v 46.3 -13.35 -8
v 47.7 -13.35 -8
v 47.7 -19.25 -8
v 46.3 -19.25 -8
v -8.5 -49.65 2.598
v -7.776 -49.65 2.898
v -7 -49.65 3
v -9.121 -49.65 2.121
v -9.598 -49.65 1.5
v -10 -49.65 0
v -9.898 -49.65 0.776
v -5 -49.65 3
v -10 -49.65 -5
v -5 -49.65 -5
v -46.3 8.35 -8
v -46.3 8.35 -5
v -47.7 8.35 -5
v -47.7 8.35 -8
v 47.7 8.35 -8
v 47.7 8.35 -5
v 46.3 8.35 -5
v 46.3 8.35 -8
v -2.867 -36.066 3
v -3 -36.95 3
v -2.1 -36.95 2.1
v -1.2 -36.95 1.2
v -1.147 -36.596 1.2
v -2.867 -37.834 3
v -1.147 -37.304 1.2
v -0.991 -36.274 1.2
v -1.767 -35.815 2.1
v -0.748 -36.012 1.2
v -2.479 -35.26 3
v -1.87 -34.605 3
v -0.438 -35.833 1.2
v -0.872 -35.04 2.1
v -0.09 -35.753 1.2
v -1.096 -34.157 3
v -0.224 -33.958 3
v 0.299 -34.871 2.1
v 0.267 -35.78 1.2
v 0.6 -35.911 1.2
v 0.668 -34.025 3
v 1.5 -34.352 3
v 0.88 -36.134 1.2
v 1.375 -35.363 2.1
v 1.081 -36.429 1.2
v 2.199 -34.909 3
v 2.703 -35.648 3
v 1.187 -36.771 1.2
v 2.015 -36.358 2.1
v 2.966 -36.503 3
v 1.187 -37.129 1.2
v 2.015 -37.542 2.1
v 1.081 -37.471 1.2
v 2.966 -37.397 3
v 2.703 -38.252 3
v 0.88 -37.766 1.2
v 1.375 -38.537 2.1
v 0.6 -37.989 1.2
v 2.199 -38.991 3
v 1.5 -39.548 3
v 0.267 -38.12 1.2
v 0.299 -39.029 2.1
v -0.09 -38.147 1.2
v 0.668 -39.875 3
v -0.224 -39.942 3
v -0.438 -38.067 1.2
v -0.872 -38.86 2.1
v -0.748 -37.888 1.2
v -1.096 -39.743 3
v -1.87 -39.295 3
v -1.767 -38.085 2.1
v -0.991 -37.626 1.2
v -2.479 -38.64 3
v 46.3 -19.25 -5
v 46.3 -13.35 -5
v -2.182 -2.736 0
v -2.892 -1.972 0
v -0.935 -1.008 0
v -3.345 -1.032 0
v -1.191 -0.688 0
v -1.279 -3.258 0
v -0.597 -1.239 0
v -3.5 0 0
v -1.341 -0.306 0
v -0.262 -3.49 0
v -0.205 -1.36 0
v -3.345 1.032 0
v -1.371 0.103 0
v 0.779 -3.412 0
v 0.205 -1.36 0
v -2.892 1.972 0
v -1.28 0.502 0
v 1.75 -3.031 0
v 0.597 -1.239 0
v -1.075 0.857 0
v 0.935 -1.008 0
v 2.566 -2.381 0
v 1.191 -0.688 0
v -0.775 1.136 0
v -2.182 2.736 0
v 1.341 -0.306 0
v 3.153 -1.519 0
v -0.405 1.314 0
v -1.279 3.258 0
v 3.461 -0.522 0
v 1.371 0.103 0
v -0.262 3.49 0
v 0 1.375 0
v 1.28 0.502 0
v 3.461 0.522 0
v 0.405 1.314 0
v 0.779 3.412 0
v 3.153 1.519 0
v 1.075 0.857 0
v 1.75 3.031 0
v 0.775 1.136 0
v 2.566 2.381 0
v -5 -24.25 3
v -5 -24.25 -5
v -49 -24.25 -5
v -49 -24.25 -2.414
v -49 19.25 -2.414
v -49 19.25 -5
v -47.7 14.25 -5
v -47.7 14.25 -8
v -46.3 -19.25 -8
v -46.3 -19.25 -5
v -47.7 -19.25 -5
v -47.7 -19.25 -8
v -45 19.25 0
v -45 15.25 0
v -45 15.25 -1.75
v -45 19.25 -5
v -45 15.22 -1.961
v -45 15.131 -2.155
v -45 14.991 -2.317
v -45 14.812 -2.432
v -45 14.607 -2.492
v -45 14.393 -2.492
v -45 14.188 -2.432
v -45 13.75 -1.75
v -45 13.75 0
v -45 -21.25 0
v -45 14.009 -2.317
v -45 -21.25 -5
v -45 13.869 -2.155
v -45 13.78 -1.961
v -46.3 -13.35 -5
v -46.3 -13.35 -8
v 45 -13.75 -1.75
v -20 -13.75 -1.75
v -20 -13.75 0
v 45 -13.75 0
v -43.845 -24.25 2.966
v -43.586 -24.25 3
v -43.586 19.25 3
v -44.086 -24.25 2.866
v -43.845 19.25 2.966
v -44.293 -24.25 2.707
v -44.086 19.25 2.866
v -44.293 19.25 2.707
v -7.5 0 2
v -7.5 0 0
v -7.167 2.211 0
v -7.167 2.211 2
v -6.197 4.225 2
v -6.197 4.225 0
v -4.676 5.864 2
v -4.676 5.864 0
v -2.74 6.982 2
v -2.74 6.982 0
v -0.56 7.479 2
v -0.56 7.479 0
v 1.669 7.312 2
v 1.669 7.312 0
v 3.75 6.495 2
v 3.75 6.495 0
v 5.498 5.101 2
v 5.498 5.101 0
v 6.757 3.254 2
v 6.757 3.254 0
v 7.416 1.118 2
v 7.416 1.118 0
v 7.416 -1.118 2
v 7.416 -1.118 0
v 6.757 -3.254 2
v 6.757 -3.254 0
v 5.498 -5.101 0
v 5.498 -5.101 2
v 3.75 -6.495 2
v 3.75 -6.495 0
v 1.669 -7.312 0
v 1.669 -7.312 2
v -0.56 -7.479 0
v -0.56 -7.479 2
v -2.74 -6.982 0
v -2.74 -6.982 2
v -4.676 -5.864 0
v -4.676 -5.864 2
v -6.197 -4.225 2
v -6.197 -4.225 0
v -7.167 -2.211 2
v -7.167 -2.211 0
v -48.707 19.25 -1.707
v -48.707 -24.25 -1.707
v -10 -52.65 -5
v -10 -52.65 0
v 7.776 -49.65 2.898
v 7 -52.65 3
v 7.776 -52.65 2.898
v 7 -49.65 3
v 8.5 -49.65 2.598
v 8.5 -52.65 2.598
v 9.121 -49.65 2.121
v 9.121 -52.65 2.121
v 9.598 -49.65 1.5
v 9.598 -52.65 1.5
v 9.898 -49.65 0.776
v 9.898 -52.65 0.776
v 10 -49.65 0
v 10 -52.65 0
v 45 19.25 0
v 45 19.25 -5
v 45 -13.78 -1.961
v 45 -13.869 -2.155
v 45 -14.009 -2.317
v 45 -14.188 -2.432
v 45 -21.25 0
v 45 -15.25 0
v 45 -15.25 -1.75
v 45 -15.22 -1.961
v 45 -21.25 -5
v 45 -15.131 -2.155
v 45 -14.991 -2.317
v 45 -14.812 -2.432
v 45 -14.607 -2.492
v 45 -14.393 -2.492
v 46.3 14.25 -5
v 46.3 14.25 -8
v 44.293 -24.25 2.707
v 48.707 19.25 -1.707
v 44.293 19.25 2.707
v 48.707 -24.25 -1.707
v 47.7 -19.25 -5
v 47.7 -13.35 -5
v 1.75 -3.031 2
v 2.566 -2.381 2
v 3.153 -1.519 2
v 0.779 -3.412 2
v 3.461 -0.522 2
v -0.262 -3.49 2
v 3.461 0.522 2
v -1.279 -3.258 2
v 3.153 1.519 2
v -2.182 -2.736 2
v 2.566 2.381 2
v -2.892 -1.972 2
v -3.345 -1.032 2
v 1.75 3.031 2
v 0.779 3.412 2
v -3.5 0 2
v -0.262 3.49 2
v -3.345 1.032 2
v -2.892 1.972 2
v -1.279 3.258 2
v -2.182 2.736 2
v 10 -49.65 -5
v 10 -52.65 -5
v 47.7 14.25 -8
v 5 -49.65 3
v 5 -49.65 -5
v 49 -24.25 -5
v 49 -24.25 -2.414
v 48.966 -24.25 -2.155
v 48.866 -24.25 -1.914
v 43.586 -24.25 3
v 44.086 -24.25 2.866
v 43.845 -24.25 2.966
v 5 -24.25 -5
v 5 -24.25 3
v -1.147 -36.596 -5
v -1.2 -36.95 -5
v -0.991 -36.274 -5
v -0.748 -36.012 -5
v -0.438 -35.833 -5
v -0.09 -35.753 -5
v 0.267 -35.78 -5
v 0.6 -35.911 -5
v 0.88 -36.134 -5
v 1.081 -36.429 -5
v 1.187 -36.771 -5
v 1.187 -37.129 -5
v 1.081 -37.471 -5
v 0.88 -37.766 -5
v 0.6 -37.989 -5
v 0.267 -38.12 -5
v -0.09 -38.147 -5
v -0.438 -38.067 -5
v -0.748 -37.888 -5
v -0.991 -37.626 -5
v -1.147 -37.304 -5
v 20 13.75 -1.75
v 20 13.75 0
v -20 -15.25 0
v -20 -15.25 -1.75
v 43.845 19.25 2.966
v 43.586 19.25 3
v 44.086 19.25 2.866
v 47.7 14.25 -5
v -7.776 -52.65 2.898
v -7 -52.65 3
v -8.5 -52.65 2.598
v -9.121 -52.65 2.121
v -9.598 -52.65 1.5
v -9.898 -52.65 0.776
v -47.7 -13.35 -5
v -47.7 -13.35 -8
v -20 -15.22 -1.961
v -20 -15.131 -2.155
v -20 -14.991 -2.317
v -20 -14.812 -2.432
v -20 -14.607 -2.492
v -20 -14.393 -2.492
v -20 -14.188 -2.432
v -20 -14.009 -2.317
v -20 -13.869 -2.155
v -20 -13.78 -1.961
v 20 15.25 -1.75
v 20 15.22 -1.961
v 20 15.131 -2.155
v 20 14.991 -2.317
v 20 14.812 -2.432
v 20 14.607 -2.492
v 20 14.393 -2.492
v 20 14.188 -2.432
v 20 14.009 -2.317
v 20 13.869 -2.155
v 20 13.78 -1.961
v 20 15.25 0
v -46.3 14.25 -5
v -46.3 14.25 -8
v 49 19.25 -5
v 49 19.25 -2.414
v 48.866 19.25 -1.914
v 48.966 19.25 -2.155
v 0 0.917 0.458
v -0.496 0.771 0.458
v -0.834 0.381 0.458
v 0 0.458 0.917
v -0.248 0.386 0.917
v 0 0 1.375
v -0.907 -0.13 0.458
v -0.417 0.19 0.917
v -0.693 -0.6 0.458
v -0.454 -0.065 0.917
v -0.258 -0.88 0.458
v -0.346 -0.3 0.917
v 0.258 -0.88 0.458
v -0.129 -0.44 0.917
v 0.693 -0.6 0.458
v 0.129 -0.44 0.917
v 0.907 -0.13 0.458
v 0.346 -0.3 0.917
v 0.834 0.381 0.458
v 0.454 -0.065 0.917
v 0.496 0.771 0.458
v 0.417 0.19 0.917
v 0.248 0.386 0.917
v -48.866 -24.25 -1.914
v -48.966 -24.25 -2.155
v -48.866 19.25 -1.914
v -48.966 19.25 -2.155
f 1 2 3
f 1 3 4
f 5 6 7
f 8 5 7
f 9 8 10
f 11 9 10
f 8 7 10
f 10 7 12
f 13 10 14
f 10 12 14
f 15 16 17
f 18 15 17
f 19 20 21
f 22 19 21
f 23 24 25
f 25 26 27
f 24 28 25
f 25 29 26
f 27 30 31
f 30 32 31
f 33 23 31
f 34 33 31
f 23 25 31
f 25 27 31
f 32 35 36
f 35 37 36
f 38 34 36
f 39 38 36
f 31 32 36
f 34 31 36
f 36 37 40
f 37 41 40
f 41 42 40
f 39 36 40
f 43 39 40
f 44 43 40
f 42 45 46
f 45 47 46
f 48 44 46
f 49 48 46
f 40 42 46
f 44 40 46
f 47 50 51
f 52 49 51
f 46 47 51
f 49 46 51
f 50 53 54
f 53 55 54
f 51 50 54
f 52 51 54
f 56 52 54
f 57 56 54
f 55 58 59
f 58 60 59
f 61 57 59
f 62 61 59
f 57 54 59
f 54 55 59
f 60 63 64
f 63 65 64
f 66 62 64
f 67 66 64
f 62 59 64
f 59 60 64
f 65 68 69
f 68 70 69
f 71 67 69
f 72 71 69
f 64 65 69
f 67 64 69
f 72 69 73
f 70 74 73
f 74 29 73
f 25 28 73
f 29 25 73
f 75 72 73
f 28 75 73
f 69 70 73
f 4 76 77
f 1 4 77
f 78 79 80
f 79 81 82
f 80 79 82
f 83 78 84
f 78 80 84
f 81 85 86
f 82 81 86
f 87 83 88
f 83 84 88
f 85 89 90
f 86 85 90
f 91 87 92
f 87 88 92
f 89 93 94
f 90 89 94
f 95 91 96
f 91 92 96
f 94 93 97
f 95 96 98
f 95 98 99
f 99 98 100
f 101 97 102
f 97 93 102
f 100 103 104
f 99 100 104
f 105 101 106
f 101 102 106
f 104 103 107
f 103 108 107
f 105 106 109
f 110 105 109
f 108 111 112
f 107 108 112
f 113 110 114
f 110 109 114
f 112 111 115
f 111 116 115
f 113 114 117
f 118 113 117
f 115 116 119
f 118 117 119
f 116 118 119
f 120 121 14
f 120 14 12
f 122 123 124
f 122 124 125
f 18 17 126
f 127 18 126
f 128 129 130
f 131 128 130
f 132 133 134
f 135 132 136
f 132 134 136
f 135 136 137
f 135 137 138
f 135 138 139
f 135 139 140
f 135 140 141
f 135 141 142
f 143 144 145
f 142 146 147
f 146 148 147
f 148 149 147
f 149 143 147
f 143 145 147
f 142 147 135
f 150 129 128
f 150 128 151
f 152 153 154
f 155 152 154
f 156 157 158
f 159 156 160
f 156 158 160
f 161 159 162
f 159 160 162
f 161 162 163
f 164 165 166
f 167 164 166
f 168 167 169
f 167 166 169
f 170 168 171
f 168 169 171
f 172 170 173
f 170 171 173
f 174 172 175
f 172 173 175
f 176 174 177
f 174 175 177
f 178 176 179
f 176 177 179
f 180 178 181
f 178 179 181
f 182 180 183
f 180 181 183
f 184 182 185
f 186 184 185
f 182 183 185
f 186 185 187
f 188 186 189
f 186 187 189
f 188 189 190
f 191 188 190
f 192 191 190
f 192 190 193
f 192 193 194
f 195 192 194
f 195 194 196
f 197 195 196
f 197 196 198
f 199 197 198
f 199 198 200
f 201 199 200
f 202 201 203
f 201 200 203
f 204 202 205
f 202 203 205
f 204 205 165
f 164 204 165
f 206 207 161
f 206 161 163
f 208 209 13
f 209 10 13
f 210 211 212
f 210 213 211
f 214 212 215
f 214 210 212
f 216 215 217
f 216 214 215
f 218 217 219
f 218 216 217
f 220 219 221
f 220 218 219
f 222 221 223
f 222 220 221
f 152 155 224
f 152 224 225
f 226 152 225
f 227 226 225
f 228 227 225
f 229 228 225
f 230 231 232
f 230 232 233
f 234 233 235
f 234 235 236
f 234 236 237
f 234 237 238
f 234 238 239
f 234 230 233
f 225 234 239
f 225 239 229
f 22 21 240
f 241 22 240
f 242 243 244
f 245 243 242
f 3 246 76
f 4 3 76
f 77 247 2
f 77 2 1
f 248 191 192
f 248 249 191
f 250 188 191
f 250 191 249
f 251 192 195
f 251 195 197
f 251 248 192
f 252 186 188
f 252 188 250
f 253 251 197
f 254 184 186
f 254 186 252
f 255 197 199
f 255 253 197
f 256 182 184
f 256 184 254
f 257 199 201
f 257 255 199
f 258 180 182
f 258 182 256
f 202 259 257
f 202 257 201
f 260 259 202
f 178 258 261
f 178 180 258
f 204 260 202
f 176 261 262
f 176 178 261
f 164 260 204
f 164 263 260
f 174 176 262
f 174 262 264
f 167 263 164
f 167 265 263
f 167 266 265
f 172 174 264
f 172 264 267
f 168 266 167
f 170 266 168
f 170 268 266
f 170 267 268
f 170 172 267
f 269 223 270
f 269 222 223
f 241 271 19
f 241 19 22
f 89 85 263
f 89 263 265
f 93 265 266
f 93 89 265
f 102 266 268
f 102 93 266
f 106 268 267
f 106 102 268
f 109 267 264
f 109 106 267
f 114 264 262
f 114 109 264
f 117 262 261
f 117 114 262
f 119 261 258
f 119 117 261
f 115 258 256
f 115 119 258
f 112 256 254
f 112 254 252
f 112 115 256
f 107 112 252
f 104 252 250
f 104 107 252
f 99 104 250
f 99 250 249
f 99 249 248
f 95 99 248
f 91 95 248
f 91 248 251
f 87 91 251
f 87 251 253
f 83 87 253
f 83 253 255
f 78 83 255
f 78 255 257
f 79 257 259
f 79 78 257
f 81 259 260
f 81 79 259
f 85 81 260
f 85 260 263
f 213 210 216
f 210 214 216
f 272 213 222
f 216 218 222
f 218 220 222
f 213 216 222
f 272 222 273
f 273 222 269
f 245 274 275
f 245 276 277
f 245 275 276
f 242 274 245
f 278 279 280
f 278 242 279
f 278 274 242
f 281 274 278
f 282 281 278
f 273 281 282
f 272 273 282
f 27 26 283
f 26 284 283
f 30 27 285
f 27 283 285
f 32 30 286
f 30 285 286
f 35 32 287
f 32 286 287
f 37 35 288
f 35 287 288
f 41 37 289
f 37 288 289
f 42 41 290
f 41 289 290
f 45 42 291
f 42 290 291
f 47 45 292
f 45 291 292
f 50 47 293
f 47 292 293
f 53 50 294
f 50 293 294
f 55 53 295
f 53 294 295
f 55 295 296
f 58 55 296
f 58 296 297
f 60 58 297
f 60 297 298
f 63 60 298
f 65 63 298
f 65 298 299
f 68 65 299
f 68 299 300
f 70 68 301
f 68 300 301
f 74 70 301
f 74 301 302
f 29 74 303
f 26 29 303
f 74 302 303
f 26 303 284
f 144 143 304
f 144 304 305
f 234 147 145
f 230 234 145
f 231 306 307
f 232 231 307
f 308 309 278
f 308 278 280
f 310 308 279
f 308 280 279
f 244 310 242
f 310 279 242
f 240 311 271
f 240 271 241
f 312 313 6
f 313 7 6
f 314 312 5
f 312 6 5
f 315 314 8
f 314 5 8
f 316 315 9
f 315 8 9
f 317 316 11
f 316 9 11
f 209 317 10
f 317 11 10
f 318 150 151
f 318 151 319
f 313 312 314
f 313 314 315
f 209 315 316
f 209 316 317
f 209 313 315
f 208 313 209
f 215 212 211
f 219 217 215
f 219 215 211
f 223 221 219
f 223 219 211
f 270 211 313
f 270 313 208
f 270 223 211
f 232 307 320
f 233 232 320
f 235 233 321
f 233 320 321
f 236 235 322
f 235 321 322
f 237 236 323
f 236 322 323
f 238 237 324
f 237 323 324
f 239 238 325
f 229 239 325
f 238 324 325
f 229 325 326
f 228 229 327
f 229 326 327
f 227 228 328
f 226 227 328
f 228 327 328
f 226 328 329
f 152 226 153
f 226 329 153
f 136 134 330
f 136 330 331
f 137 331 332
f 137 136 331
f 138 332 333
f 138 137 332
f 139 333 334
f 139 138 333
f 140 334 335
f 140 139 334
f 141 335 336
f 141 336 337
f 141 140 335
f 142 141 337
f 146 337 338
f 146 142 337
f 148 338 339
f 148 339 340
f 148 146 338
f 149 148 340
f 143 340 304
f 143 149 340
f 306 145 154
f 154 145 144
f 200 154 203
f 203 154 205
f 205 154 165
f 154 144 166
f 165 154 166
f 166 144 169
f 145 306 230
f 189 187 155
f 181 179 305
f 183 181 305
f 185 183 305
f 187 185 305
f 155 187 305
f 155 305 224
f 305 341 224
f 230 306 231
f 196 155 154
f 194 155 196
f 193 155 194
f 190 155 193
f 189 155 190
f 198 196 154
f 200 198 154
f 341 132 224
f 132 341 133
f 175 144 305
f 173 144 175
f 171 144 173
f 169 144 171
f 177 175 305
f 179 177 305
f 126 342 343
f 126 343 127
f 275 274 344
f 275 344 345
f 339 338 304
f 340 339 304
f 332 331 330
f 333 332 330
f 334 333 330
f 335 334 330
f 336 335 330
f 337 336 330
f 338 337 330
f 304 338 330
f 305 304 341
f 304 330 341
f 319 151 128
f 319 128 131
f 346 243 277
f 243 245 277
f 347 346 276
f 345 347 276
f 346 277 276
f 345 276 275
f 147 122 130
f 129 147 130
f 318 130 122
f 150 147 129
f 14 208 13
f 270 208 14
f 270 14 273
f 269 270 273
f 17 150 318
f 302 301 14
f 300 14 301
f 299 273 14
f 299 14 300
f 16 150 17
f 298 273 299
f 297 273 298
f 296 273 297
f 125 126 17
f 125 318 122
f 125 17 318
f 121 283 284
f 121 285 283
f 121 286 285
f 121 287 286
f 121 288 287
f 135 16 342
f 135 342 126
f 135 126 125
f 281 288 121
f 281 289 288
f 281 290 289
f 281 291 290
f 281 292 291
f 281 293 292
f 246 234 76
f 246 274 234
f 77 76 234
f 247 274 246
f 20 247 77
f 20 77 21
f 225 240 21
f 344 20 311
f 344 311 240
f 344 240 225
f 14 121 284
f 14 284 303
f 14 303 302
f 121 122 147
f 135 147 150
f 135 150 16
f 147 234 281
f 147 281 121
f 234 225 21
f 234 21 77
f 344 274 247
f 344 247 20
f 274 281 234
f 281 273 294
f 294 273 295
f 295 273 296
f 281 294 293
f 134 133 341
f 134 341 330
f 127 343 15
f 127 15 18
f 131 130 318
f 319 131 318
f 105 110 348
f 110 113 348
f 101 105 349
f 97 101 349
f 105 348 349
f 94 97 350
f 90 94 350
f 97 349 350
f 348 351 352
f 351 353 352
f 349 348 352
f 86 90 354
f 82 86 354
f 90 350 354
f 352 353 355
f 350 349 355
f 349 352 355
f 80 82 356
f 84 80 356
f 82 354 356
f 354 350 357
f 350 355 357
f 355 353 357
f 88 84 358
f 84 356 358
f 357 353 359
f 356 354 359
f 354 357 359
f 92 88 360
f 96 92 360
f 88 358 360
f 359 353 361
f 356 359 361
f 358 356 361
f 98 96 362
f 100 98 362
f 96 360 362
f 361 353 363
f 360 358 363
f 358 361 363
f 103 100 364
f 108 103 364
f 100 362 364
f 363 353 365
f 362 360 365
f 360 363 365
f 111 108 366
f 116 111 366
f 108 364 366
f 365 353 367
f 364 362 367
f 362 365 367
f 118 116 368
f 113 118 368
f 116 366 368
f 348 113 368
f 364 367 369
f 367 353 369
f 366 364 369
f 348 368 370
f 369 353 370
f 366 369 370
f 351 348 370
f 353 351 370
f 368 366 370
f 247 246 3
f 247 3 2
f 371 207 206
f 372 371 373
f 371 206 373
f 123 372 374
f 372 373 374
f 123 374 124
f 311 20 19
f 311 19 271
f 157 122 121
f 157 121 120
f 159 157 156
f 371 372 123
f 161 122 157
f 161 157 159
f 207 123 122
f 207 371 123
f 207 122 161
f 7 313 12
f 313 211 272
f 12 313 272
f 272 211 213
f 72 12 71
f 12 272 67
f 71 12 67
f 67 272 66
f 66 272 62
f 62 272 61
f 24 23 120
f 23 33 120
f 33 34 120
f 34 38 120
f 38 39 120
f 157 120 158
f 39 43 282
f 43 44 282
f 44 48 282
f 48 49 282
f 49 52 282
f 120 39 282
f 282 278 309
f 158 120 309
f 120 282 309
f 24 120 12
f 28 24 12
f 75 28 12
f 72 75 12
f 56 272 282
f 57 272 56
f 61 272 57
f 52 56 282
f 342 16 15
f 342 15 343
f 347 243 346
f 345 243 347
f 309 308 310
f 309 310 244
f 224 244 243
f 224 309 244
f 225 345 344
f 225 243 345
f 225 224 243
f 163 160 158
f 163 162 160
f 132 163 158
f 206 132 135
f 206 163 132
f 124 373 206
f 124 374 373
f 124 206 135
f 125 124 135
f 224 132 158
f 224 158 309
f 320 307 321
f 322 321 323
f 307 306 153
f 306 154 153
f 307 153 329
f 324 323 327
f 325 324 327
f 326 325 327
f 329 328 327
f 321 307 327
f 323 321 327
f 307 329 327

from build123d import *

# Parameters (mm, degrees)
SKETCH2_W                                       = 96
SKETCH2_H                                       = 38.5
BOSS_EXTRUDE1_DEPTH                             = 3
BOSS_EXTRUDE2_DEPTH                             = 45
BOSS_EXTRUDE2_DEPTH_BACK                        = 20
BOSS_EXTRUDE3_DEPTH                             = 20
BOSS_EXTRUDE3_DEPTH_BACK                        = 45
SKETCH5_W                                       = 8
SKETCH5_H                                       = 5
BOSS_EXTRUDE4_DEPTH                             = 96
SKETCH6_W                                       = 3
SKETCH6_H                                       = 5
BOSS_EXTRUDE5_DEPTH                             = 38.5
SKETCH7_R                                       = 7.5
SKETCH7_R_2                                     = 3.5
CUT_EXTRUDE2_DEPTH                              = 2
MOVE_FACE1_BY                                   = 1
MOVE_FACE2_BY                                   = 1
SKETCH8_W                                       = 1.4
SKETCH8_H                                       = 5.9
BOSS_EXTRUDE6_DEPTH                             = 3
SKETCH9_W                                       = 10
SKETCH9_H                                       = 8
BOSS_EXTRUDE7_DEPTH                             = 25.4
SKETCH11_W                                      = 8
SKETCH11_H                                      = 3
BOSS_EXTRUDE8_DEPTH                             = 10
CHAMFER1_SIZE                                   = 5
FILLET1_R                                       = 1
FILLET3_R                                       = 3
MOVE_FACE3_BY                                   = 2
CSK_FOR_M2_FLAT_HEAD_MACHINE_SCREW1_D           = 2.4
CSK_FOR_M2_FLAT_HEAD_MACHINE_SCREW1_CSINK_D     = 6
CSK_FOR_M2_FLAT_HEAD_MACHINE_SCREW1_CSINK_ANGLE = 90


with BuildPart() as part:
    # Sketch2 → Boss-Extrude1 (new body)
    with BuildSketch(Plane.XY):
        Rectangle(SKETCH2_W, SKETCH2_H)
    extrude(amount=BOSS_EXTRUDE1_DEPTH)

    # Sketch3 → Boss-Extrude2 (add, two sides: drawn at the far end of the back side and taken through both)
    with BuildSketch(Plane(origin=(0, 0, 0), x_dir=(0, 0, -1), z_dir=(1, 0, 0)).offset(-BOSS_EXTRUDE2_DEPTH_BACK)):
        with BuildLine():
            Line((0, -15.25), (1.75, -15.25))
            ThreePointArc((1.75, -15.25), (2.5, -14.5), (1.75, -13.75))
            Line((1.75, -13.75), (0, -13.75))
            Line((0, -13.75), (0, -15.25))
        make_face()
    extrude(amount=BOSS_EXTRUDE2_DEPTH + BOSS_EXTRUDE2_DEPTH_BACK)

    # Sketch3<3> → Boss-Extrude3 (add, two sides: drawn at the far end of the back side and taken through both)
    with BuildSketch(Plane(origin=(0, 0, 0), x_dir=(0, 0, -1), z_dir=(1, 0, 0)).offset(-BOSS_EXTRUDE3_DEPTH_BACK)):
        with BuildLine():
            Line((0, 13.75), (0, 15.25))
            Line((0, 15.25), (1.75, 15.25))
            ThreePointArc((1.75, 15.25), (2.5, 14.5), (1.75, 13.75))
            Line((1.75, 13.75), (0, 13.75))
        make_face()
    extrude(amount=BOSS_EXTRUDE3_DEPTH + BOSS_EXTRUDE3_DEPTH_BACK)

    # Cut-Extrude1 cone 1 section (through the dimple's axis) → Cut-Extrude1 (revolve, cut)
    with BuildSketch(Plane.YZ):
        Polygon((0, 0), (1.375, 0), (0, 1.375), align=None)
    revolve(axis=Axis((0, 0, 0), (0, 0, 1)), mode=Mode.SUBTRACT)

    # Sketch5 → Boss-Extrude4 (add, through all)
    with BuildSketch(Plane.ZY.offset(48)):
        with Locations((-1, -21.75)):
            Rectangle(SKETCH5_W, SKETCH5_H)
    extrude(amount=-BOSS_EXTRUDE4_DEPTH)

    # Sketch6 → Boss-Extrude5 (add, through all)
    with BuildSketch(Plane(origin=(0, -19.25, 0), x_dir=(1, 0, 0), z_dir=(0, 1, 0))):
        with Locations((-46.5, 2.5)):
            Rectangle(SKETCH6_W, SKETCH6_H)
        with Locations((46.5, 2.5)):
            Rectangle(SKETCH6_W, SKETCH6_H)
    extrude(amount=BOSS_EXTRUDE5_DEPTH)

    # Sketch7 → Cut-Extrude2 (cut)
    with BuildSketch(Plane(origin=(0, 0, 0), x_dir=(-1, 0, 0), z_dir=(0, 0, -1))):
        Circle(SKETCH7_R)
        Circle(SKETCH7_R_2, mode=Mode.SUBTRACT)
    extrude(amount=-CUT_EXTRUDE2_DEPTH, mode=Mode.SUBTRACT)

    # Move Face1: a face moved outward by 1.0
    extrude(part.faces().sort_by_distance((-48, -2.5, -1))[0], amount=MOVE_FACE1_BY, dir=(-1, 0, 0))

    # Move Face2: a face moved outward by 1.0
    extrude(part.faces().sort_by_distance((48, -2.5, -1))[0], amount=MOVE_FACE2_BY, dir=(1, 0, 0))

    # Sketch8 → Boss-Extrude6 (add)
    with BuildSketch(Plane(origin=(0, 0, -5), x_dir=(-1, 0, 0), z_dir=(0, 0, -1))):
        with Locations((-47, 11.3)):
            Rectangle(SKETCH8_W, SKETCH8_H)
        with Locations((-47, -16.3)):
            Rectangle(SKETCH8_W, SKETCH8_H)
        with Locations((47, 11.3)):
            Rectangle(SKETCH8_W, SKETCH8_H)
        with Locations((47, -16.3)):
            Rectangle(SKETCH8_W, SKETCH8_H)
    extrude(amount=BOSS_EXTRUDE6_DEPTH)

    # Sketch9 → Boss-Extrude7 (add)
    with BuildSketch(Plane.XZ.offset(24.25)):
        with Locations((0, -1)):
            Rectangle(SKETCH9_W, SKETCH9_H)
    extrude(amount=BOSS_EXTRUDE7_DEPTH)

    # Sketch11 → Boss-Extrude8 (add, symmetric)
    with BuildSketch(Plane(origin=(0, 0, 0), x_dir=(0, 0, -1), z_dir=(1, 0, 0))):
        with Locations((1, -51.15)):
            Rectangle(SKETCH11_W, SKETCH11_H)
    extrude(amount=BOSS_EXTRUDE8_DEPTH, both=True)

    # Chamfer1
    chamfer1_edges = [part.edges().sort_by_distance(p)[0] for p in [
        (49, -2.5, 3),
        (-49, -2.5, 3),
    ]]
    chamfer(chamfer1_edges, length=CHAMFER1_SIZE)

    # Fillet1
    fillet1_edges = [part.edges().sort_by_distance(p)[0] for p in [
        (44, -2.5, 3),
        (-44, -2.5, 3),
        (-49, -2.5, -2),
        (49, -2.5, -2),
    ]]
    fillet(fillet1_edges, radius=FILLET1_R)

    # Fillet3
    fillet3_edges = [part.edges().sort_by_distance(p)[0] for p in [
        (-10, -51.15, 3),
        (10, -51.15, 3),
    ]]
    fillet(fillet3_edges, radius=FILLET3_R)

    # Move Face3: a face moved inward by 2.0
    extrude(part.faces().sort_by_distance((0, -19.25, -2.5))[0], amount=MOVE_FACE3_BY, dir=(0, -1, 0), mode=Mode.SUBTRACT)

    # CSK for M2 Flat Head Machine Screw1 (through all)
    with Locations(Plane.XY.offset(3)):
        with Locations((0, -36.95)):
            CounterSinkHole(CSK_FOR_M2_FLAT_HEAD_MACHINE_SCREW1_D / 2, CSK_FOR_M2_FLAT_HEAD_MACHINE_SCREW1_CSINK_D / 2, counter_sink_angle=CSK_FOR_M2_FLAT_HEAD_MACHINE_SCREW1_CSINK_ANGLE)


solid = part.part
